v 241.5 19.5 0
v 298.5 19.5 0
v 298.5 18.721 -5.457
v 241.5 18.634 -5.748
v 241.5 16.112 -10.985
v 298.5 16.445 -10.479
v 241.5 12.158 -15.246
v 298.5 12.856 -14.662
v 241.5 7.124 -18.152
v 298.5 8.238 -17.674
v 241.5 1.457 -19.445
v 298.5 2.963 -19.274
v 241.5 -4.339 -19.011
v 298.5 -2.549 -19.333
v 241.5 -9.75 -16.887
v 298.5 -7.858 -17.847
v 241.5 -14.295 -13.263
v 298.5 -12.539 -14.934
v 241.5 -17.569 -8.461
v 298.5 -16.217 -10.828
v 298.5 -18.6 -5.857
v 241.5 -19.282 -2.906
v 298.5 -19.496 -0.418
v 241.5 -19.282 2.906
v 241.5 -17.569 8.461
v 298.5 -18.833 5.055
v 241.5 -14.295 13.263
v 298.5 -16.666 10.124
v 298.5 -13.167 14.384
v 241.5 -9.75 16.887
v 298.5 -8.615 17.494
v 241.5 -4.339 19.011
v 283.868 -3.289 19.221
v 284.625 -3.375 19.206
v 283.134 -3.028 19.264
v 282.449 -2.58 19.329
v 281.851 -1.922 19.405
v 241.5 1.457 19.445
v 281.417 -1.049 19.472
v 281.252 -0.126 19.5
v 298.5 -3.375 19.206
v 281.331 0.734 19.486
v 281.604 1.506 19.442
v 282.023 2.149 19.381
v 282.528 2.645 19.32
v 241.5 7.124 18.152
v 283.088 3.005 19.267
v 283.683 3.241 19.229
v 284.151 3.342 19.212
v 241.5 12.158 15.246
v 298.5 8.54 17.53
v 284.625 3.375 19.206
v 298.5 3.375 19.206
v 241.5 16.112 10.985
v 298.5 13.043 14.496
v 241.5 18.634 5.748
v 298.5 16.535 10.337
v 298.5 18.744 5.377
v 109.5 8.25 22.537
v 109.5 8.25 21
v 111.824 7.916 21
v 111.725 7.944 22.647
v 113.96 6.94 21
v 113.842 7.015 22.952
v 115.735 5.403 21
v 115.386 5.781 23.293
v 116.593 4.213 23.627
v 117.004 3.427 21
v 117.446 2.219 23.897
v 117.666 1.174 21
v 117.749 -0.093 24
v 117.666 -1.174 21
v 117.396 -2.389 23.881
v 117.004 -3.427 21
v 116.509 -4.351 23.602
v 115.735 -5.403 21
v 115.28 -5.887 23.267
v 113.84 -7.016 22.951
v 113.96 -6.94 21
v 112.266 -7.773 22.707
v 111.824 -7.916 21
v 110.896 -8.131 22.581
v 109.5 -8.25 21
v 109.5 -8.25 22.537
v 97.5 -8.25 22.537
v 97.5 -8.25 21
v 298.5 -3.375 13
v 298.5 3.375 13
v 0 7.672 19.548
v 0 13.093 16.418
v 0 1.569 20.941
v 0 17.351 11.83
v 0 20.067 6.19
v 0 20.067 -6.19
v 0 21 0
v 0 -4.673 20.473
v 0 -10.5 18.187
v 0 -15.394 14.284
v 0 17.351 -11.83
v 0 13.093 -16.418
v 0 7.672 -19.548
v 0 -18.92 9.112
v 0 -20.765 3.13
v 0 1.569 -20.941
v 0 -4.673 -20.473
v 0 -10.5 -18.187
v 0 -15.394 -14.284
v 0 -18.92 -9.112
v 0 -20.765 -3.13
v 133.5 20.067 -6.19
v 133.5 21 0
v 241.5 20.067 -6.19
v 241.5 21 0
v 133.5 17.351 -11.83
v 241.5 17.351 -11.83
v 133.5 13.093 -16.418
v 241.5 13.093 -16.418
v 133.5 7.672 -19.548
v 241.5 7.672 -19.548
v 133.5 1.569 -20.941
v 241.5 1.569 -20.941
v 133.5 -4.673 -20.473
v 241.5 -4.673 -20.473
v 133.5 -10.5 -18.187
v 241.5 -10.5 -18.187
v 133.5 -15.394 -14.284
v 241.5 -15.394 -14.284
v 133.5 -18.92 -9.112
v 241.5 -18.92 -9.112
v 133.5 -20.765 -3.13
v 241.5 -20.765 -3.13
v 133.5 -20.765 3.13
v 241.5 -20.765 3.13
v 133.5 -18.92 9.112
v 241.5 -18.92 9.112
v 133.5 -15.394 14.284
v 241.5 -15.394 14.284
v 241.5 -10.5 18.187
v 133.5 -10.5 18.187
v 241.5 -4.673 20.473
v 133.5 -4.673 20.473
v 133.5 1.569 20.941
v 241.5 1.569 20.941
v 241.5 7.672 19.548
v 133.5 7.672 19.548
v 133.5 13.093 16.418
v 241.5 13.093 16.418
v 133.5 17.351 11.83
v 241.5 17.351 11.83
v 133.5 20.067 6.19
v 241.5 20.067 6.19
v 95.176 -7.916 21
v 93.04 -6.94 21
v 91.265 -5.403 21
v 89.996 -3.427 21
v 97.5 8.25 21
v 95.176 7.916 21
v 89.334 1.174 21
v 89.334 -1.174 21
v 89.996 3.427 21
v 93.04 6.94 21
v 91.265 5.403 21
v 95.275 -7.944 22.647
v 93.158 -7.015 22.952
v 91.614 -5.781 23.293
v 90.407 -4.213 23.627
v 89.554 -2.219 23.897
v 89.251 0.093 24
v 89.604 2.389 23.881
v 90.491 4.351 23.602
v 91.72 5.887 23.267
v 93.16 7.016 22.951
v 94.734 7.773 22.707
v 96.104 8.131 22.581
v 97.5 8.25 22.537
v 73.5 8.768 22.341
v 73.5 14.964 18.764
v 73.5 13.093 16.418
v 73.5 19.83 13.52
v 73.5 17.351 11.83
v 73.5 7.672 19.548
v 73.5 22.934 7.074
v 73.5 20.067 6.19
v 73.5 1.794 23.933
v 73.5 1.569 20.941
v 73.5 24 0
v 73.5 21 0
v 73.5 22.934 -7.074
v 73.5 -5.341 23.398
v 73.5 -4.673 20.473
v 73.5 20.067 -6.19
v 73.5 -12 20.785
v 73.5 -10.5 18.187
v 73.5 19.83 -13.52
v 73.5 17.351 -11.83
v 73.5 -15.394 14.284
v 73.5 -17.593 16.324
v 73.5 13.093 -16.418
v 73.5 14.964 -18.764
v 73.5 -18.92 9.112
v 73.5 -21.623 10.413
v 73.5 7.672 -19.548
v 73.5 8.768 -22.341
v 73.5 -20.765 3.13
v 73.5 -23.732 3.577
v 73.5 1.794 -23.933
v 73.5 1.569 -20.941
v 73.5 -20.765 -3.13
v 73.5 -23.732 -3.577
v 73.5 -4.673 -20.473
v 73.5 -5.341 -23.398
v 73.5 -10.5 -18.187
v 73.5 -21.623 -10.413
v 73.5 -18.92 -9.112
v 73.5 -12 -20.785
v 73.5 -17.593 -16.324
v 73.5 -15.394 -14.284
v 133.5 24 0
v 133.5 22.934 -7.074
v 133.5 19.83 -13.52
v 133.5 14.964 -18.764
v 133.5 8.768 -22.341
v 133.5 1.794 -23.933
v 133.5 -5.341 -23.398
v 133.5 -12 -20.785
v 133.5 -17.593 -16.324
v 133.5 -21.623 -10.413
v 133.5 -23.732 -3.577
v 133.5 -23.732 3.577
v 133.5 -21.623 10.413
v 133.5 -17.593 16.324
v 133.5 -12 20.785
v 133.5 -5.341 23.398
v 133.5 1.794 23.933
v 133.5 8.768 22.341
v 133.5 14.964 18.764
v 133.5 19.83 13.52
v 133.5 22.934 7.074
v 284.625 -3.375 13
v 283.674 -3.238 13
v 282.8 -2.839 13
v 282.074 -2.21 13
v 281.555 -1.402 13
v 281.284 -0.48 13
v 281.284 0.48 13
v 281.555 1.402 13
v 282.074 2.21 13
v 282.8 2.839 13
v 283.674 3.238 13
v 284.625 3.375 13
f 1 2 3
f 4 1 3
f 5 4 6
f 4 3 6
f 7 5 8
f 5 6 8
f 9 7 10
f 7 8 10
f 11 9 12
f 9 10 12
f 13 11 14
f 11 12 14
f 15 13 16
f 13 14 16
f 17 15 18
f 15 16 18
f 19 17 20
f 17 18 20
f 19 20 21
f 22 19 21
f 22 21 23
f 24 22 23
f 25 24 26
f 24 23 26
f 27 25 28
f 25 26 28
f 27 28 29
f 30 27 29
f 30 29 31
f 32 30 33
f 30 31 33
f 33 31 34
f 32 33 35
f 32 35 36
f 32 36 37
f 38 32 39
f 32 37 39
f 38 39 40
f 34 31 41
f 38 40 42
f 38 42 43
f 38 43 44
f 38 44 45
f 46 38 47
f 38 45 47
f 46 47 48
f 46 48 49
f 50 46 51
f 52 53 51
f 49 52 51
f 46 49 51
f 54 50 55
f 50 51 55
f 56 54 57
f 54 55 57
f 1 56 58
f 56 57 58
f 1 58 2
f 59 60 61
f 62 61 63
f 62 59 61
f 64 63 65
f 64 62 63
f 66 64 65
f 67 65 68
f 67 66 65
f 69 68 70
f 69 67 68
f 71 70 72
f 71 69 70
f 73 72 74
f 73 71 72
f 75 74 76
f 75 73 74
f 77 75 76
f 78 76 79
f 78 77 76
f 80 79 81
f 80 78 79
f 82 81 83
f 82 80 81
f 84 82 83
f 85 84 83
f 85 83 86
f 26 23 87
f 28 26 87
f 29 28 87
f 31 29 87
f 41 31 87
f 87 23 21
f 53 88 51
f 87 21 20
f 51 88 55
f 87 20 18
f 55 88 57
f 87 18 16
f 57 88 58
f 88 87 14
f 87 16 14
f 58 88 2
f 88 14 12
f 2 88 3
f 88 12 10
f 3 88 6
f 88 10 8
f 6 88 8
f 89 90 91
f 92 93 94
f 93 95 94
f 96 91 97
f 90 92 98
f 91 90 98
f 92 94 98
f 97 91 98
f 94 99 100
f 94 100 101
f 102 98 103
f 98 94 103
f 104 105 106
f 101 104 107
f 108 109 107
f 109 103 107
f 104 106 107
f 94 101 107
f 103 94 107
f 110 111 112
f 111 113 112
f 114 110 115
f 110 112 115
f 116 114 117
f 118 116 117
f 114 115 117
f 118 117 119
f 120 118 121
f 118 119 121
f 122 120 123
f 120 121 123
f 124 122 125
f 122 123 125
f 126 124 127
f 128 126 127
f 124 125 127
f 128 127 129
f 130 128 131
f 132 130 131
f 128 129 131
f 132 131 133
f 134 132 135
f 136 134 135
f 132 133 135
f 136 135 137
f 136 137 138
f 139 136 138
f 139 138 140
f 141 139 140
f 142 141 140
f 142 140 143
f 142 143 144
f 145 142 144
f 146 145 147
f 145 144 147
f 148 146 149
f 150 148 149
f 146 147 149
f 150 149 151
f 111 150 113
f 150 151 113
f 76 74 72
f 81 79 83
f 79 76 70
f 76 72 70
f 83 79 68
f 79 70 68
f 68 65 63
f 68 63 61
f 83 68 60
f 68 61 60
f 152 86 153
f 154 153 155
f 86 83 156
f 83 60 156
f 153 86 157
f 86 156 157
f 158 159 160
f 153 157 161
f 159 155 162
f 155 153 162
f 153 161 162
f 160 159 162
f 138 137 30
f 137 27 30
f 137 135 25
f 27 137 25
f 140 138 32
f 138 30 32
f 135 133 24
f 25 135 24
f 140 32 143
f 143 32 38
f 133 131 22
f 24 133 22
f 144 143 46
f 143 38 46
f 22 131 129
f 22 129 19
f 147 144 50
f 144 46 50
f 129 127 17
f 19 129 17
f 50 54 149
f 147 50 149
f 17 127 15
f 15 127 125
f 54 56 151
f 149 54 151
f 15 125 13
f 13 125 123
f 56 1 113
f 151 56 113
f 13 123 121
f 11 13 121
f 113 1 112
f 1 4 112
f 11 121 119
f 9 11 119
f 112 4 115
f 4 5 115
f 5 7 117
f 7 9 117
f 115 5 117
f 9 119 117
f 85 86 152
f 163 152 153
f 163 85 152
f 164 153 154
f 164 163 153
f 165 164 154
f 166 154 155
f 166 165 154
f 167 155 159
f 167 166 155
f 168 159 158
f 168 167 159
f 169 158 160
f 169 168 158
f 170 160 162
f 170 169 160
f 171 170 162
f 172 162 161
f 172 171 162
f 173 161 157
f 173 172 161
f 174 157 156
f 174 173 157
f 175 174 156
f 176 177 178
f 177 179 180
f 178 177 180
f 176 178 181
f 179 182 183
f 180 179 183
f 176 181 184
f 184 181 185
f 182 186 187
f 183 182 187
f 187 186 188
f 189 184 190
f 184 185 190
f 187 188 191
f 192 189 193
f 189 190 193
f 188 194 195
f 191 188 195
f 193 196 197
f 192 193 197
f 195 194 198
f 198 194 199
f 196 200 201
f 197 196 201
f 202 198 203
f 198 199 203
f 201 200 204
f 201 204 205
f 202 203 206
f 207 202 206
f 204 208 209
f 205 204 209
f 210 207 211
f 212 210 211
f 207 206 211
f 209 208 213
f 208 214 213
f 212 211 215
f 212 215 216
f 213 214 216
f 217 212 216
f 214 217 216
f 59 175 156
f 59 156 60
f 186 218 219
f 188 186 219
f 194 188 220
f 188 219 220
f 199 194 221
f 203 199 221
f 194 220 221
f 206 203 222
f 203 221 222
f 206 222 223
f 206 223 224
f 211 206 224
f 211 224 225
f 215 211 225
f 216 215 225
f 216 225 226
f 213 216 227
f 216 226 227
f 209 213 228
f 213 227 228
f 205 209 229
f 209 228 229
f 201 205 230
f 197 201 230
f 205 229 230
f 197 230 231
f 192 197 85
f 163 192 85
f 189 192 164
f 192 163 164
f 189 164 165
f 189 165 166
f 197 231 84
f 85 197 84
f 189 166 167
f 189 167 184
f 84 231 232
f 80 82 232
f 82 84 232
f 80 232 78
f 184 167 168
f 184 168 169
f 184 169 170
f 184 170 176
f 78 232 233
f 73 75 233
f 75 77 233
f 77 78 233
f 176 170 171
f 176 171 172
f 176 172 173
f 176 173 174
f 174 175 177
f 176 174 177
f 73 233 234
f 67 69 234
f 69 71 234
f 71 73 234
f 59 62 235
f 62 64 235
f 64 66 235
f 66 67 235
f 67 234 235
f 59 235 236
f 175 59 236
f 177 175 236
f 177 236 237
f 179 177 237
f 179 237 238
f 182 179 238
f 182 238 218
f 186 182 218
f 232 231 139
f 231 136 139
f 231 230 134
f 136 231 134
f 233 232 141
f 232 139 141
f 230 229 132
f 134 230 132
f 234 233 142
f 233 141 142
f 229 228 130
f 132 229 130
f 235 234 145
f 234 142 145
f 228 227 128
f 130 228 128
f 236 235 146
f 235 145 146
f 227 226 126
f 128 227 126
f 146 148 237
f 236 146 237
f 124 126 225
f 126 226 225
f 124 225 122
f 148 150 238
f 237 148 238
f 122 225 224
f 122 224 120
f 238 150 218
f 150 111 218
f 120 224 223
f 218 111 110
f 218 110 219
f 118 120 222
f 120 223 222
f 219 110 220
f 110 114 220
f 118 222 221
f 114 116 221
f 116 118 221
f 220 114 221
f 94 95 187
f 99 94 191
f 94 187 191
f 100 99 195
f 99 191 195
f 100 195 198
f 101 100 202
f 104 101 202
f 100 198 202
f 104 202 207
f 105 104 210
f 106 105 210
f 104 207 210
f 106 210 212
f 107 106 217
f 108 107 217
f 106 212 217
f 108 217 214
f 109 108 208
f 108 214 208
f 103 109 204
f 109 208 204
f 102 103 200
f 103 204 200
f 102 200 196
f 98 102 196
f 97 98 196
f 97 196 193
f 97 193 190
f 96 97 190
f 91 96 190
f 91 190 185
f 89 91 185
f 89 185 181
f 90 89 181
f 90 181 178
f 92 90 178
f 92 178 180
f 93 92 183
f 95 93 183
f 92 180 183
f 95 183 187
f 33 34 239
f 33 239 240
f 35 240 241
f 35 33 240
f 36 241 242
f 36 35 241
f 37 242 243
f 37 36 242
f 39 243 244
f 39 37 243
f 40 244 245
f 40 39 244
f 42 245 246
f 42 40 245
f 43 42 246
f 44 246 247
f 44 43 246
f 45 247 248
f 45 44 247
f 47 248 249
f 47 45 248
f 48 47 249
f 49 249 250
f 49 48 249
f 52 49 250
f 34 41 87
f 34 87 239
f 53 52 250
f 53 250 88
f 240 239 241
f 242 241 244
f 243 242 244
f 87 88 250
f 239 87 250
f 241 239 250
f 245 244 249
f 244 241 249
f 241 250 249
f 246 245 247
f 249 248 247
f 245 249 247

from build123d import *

# Parameters (mm, degrees)
CUT_EXTRUDE1_DEPTH = 6.5
CUT_EXTRUDE2_DEPTH = 3


with BuildPart() as part:
    # Sketch1 → Revolve1 (revolve)
    with BuildSketch(Plane.XY):
        Polygon((0, 0), (0, 21), (73.5, 21), (73.5, 24), (133.5, 24), (133.5, 21), (241.5, 21), (241.5, 19.5), (298.5, 19.5), (298.5, 0), align=None)
    revolve(axis=Axis((298.5, 0, 0), (-1, 0, 0)))

    # Sketch3 → Cut-Extrude1 (cut)
    with BuildSketch(Plane.XY.offset(19.5)):
        with BuildLine():
            Line((312.375, -3.375), (284.625, -3.375))
            ThreePointArc((284.625, -3.375), (281.25, 0), (284.625, 3.375))
            Line((284.625, 3.375), (312.375, 3.375))
            ThreePointArc((312.375, 3.375), (315.75, 0), (312.375, -3.375))
        make_face()
    extrude(amount=-CUT_EXTRUDE1_DEPTH, mode=Mode.SUBTRACT)

    # Sketch4 → Cut-Extrude2 (cut)
    with BuildSketch(Plane.XY.offset(24)):
        with BuildLine():
            Line((97.5, 8.25), (109.5, 8.25))
            ThreePointArc((109.5, 8.25), (117.75, 0), (109.5, -8.25))
            Line((109.5, -8.25), (97.5, -8.25))
            ThreePointArc((97.5, -8.25), (89.25, 0), (97.5, 8.25))
        make_face()
    extrude(amount=-CUT_EXTRUDE2_DEPTH, mode=Mode.SUBTRACT)


solid = part.part
